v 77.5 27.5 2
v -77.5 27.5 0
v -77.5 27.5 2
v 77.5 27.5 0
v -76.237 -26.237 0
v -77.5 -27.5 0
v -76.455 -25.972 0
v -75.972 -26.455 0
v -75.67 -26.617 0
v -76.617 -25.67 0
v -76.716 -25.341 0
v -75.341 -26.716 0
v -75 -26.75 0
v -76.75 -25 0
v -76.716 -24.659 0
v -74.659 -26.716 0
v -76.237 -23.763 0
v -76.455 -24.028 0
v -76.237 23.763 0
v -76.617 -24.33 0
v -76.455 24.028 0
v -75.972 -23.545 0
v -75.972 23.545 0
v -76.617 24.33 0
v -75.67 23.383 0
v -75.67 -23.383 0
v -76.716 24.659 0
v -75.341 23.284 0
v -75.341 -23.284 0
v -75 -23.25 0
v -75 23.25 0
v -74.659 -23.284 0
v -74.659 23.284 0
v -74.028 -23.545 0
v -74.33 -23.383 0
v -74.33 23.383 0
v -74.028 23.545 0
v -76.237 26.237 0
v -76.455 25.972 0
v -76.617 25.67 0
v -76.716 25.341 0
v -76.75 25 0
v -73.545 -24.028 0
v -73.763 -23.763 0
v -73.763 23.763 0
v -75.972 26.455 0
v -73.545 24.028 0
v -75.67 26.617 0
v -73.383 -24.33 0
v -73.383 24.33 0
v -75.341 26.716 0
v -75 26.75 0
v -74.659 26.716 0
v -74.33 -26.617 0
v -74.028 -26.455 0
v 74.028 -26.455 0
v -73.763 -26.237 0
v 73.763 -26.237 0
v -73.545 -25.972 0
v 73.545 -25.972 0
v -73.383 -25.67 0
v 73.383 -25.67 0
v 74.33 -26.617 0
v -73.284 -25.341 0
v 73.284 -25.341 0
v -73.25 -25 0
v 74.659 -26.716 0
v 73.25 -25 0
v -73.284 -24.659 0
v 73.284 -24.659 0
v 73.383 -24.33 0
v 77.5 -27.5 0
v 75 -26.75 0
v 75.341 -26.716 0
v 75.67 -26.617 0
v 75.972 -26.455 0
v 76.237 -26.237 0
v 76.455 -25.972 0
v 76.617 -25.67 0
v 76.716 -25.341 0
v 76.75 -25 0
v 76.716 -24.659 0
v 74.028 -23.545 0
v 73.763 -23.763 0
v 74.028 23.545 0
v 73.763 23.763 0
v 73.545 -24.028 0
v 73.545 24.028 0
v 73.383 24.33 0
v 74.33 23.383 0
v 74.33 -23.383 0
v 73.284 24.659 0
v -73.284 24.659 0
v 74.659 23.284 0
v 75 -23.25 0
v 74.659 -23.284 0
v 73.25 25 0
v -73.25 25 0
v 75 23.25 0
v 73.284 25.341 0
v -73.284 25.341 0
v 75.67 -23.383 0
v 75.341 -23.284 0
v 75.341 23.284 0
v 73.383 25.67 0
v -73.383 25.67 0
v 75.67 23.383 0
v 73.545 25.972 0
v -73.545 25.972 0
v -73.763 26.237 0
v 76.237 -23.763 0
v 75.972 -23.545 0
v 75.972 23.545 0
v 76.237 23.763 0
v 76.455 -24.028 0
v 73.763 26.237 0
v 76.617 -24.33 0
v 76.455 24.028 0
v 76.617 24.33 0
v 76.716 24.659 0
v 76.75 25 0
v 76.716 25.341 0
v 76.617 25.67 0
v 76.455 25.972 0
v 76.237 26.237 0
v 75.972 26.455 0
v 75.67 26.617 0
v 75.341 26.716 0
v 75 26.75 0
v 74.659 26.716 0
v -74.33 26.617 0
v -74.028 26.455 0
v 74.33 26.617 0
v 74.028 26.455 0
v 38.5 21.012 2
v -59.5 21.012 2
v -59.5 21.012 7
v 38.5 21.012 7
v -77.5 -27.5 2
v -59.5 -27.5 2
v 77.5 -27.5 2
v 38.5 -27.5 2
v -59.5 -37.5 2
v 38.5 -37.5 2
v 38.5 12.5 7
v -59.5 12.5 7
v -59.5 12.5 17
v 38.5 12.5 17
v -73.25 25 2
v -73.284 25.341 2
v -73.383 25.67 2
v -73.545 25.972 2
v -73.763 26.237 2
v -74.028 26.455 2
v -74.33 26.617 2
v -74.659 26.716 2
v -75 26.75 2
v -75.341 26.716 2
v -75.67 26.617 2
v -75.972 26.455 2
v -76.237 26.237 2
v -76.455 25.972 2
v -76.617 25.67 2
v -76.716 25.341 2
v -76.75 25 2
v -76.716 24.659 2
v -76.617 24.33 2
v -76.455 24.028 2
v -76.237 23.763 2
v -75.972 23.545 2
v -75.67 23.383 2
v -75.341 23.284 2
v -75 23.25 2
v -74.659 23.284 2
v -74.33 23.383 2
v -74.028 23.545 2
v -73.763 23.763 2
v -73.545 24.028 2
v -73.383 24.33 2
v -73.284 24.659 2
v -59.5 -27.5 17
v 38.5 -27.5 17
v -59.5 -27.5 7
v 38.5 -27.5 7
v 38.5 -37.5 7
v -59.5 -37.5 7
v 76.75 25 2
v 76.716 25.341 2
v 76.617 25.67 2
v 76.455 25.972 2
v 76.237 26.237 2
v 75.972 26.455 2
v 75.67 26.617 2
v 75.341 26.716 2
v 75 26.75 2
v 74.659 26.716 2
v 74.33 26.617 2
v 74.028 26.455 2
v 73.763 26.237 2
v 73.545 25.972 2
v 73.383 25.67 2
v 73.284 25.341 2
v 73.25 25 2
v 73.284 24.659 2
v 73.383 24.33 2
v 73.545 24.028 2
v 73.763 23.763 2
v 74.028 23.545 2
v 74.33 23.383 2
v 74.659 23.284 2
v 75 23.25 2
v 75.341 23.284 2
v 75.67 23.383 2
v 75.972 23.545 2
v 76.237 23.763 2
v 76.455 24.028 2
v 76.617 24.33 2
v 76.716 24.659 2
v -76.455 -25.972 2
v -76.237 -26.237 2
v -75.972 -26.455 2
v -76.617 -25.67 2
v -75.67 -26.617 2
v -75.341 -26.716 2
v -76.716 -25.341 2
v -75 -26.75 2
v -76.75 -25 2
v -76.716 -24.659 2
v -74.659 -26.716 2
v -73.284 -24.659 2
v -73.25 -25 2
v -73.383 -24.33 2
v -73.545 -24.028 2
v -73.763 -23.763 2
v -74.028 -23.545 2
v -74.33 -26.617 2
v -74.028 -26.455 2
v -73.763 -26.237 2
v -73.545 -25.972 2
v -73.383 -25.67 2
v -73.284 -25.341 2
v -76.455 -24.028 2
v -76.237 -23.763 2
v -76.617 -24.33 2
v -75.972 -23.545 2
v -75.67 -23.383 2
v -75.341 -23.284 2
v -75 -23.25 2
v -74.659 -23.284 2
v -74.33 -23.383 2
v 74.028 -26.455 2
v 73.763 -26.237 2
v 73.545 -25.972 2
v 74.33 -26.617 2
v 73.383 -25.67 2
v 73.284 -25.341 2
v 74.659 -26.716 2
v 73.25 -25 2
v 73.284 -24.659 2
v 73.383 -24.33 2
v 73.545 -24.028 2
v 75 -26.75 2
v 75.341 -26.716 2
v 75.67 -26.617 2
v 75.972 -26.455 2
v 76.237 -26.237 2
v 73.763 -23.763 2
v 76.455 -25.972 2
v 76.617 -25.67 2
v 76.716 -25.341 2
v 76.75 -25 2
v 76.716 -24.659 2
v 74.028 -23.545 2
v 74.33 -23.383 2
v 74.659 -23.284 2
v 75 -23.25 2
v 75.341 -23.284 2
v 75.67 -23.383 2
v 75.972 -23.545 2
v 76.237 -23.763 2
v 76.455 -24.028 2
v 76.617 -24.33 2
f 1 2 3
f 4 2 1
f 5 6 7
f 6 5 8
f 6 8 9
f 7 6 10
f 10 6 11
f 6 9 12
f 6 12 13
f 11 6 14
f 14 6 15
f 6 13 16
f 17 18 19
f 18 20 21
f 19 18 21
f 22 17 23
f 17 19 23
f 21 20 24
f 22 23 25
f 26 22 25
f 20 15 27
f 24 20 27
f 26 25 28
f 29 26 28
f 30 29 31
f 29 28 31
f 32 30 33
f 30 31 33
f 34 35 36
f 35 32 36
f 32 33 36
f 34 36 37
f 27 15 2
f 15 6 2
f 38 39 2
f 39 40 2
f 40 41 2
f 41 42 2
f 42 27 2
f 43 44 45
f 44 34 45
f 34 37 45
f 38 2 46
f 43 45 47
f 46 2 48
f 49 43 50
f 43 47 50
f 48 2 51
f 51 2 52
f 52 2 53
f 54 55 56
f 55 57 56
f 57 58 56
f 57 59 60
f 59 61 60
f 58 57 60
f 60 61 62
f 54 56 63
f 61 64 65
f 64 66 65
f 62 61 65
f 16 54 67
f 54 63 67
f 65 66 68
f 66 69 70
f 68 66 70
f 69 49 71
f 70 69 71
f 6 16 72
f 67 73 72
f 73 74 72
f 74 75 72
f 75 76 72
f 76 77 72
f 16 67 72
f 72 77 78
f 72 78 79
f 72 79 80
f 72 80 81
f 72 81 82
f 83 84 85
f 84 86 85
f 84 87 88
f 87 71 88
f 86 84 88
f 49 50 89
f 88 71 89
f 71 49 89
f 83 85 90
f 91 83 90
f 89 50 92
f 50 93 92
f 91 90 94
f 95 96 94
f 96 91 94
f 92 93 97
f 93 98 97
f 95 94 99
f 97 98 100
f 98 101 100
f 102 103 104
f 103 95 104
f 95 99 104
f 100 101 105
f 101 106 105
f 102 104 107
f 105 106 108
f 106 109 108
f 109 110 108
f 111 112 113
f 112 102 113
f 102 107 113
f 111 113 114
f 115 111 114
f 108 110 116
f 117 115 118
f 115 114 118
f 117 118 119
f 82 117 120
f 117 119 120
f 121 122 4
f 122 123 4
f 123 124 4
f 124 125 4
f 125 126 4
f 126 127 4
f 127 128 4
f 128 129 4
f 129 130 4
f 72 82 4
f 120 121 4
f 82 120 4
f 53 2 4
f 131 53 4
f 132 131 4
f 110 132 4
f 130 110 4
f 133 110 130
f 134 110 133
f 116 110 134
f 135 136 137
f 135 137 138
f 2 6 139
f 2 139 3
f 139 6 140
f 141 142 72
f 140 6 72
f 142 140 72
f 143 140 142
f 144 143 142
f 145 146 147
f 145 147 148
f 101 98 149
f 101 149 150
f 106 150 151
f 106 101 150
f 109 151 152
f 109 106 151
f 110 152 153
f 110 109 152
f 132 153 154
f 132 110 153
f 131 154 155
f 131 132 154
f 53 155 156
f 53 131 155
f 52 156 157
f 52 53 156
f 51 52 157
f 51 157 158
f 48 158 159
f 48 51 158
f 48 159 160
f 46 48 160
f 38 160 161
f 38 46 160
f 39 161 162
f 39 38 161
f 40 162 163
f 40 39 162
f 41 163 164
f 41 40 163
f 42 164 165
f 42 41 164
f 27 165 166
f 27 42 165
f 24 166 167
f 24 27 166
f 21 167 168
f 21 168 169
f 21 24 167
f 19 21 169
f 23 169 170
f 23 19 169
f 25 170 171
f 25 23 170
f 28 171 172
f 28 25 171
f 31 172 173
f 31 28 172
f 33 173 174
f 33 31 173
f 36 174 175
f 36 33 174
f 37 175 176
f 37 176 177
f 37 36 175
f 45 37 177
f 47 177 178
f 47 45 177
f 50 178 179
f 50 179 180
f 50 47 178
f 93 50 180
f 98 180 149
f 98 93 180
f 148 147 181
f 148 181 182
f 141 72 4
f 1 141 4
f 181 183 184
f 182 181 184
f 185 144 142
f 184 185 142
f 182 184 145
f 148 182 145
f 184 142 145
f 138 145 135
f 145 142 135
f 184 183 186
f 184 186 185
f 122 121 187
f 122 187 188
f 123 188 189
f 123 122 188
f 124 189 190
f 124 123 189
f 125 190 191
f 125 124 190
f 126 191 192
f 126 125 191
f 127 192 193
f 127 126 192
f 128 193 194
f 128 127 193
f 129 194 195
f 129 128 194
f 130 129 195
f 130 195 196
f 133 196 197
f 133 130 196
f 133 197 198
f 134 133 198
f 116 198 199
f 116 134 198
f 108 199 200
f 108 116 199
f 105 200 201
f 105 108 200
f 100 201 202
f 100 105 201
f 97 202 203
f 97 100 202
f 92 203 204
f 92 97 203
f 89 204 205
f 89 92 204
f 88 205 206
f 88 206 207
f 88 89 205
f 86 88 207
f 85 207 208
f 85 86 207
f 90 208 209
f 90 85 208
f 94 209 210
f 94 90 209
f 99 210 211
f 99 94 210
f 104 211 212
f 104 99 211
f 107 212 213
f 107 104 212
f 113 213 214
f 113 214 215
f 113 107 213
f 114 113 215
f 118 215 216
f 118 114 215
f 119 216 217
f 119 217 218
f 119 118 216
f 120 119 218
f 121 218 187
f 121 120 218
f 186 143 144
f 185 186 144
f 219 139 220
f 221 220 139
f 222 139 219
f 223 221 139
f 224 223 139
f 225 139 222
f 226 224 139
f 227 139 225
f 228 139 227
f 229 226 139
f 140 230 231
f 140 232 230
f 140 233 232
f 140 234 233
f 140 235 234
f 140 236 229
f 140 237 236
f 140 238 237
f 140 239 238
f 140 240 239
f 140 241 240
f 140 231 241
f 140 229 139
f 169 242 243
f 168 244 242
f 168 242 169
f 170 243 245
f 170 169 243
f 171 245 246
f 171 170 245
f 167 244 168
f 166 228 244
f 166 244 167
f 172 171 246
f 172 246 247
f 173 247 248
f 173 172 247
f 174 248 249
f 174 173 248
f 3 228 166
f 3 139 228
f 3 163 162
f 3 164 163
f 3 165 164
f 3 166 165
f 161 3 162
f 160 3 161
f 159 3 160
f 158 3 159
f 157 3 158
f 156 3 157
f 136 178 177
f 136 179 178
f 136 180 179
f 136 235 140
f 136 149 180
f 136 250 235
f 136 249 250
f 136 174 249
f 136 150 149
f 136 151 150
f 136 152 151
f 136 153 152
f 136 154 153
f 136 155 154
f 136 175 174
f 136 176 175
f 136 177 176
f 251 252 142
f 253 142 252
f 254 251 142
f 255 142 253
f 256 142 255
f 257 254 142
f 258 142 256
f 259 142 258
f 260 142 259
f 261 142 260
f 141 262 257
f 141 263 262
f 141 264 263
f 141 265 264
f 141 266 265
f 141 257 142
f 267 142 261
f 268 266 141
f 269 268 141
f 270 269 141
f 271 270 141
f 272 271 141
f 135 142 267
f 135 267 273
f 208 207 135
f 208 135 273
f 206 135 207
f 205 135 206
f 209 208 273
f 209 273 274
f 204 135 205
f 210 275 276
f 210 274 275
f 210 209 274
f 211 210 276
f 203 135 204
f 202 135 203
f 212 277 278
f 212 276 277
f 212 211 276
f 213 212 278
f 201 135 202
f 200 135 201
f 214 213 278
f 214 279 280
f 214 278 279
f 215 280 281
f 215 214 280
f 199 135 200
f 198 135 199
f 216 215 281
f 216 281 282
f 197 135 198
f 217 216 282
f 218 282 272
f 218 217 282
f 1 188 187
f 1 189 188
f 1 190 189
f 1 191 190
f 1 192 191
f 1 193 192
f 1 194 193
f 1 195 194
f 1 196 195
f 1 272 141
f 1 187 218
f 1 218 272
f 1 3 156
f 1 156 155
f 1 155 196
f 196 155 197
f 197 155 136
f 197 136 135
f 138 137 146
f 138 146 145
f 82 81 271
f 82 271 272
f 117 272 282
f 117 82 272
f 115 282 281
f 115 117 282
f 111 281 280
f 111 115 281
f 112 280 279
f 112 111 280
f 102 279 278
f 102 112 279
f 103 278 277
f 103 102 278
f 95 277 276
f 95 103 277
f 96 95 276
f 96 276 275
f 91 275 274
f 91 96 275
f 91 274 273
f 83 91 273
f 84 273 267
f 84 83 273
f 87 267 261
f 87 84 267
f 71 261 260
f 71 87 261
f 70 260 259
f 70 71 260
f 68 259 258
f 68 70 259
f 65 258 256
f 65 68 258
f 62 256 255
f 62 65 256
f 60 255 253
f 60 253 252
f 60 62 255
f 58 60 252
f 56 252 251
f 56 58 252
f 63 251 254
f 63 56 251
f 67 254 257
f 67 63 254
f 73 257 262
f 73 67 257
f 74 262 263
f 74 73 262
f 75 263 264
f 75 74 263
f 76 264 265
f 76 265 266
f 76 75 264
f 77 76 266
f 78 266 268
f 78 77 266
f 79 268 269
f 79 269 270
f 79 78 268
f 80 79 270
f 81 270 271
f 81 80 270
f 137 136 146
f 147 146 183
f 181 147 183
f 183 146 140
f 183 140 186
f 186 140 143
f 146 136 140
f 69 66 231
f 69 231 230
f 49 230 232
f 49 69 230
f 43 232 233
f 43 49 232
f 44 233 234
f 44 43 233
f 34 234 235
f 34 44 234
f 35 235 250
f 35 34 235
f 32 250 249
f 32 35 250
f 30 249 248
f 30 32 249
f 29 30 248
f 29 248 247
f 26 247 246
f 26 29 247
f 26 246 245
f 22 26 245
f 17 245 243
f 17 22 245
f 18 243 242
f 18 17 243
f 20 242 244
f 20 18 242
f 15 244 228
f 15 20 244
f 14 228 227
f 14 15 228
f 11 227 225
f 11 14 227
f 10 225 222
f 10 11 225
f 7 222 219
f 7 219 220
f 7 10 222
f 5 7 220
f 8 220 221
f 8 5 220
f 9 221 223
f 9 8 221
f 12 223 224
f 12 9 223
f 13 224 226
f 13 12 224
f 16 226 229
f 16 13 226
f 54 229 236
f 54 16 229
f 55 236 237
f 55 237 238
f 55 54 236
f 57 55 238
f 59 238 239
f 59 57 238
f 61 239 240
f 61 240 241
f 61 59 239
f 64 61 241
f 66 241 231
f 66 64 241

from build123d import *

# Parameters (mm, degrees)
F0_W     = 155
F0_H     = 55
F0_R     = 1.75
F1_DEPTH = 2
F2_W     = 98
F2_H     = 48.51198
F2_H_2   = 10
F3_DEPTH = 5
F4_W     = 98
F4_H     = 40
F5_DEPTH = 10


with BuildPart() as f1:
    # F0 (on Top) → F1 (new body)
    with BuildSketch(Plane.XY):
        Rectangle(F0_W, F0_H)
        with Locations((-75, -25)):
            Circle(F0_R, mode=Mode.SUBTRACT)
        with Locations((75, -25)):
            Circle(F0_R, mode=Mode.SUBTRACT)
        with Locations((-75, 25)):
            Circle(F0_R, mode=Mode.SUBTRACT)
        with Locations((75, 25)):
            Circle(F0_R, mode=Mode.SUBTRACT)
    extrude(amount=F1_DEPTH)

    # F2 (on face) → F3 (join)
    with BuildSketch(Plane.XY.offset(2)):
        with Locations((-10.5, -3.24401)):
            Rectangle(F2_W, F2_H)
        with Locations((-10.5, -32.5)):
            Rectangle(F2_W, F2_H_2)
    extrude(amount=F3_DEPTH)

    # F4 (on face) → F5 (join)
    with BuildSketch(Plane.XY.offset(7)):
        with Locations((-10.5, -7.5)):
            Rectangle(F4_W, F4_H)
    extrude(amount=F5_DEPTH)


solid = f1.part
